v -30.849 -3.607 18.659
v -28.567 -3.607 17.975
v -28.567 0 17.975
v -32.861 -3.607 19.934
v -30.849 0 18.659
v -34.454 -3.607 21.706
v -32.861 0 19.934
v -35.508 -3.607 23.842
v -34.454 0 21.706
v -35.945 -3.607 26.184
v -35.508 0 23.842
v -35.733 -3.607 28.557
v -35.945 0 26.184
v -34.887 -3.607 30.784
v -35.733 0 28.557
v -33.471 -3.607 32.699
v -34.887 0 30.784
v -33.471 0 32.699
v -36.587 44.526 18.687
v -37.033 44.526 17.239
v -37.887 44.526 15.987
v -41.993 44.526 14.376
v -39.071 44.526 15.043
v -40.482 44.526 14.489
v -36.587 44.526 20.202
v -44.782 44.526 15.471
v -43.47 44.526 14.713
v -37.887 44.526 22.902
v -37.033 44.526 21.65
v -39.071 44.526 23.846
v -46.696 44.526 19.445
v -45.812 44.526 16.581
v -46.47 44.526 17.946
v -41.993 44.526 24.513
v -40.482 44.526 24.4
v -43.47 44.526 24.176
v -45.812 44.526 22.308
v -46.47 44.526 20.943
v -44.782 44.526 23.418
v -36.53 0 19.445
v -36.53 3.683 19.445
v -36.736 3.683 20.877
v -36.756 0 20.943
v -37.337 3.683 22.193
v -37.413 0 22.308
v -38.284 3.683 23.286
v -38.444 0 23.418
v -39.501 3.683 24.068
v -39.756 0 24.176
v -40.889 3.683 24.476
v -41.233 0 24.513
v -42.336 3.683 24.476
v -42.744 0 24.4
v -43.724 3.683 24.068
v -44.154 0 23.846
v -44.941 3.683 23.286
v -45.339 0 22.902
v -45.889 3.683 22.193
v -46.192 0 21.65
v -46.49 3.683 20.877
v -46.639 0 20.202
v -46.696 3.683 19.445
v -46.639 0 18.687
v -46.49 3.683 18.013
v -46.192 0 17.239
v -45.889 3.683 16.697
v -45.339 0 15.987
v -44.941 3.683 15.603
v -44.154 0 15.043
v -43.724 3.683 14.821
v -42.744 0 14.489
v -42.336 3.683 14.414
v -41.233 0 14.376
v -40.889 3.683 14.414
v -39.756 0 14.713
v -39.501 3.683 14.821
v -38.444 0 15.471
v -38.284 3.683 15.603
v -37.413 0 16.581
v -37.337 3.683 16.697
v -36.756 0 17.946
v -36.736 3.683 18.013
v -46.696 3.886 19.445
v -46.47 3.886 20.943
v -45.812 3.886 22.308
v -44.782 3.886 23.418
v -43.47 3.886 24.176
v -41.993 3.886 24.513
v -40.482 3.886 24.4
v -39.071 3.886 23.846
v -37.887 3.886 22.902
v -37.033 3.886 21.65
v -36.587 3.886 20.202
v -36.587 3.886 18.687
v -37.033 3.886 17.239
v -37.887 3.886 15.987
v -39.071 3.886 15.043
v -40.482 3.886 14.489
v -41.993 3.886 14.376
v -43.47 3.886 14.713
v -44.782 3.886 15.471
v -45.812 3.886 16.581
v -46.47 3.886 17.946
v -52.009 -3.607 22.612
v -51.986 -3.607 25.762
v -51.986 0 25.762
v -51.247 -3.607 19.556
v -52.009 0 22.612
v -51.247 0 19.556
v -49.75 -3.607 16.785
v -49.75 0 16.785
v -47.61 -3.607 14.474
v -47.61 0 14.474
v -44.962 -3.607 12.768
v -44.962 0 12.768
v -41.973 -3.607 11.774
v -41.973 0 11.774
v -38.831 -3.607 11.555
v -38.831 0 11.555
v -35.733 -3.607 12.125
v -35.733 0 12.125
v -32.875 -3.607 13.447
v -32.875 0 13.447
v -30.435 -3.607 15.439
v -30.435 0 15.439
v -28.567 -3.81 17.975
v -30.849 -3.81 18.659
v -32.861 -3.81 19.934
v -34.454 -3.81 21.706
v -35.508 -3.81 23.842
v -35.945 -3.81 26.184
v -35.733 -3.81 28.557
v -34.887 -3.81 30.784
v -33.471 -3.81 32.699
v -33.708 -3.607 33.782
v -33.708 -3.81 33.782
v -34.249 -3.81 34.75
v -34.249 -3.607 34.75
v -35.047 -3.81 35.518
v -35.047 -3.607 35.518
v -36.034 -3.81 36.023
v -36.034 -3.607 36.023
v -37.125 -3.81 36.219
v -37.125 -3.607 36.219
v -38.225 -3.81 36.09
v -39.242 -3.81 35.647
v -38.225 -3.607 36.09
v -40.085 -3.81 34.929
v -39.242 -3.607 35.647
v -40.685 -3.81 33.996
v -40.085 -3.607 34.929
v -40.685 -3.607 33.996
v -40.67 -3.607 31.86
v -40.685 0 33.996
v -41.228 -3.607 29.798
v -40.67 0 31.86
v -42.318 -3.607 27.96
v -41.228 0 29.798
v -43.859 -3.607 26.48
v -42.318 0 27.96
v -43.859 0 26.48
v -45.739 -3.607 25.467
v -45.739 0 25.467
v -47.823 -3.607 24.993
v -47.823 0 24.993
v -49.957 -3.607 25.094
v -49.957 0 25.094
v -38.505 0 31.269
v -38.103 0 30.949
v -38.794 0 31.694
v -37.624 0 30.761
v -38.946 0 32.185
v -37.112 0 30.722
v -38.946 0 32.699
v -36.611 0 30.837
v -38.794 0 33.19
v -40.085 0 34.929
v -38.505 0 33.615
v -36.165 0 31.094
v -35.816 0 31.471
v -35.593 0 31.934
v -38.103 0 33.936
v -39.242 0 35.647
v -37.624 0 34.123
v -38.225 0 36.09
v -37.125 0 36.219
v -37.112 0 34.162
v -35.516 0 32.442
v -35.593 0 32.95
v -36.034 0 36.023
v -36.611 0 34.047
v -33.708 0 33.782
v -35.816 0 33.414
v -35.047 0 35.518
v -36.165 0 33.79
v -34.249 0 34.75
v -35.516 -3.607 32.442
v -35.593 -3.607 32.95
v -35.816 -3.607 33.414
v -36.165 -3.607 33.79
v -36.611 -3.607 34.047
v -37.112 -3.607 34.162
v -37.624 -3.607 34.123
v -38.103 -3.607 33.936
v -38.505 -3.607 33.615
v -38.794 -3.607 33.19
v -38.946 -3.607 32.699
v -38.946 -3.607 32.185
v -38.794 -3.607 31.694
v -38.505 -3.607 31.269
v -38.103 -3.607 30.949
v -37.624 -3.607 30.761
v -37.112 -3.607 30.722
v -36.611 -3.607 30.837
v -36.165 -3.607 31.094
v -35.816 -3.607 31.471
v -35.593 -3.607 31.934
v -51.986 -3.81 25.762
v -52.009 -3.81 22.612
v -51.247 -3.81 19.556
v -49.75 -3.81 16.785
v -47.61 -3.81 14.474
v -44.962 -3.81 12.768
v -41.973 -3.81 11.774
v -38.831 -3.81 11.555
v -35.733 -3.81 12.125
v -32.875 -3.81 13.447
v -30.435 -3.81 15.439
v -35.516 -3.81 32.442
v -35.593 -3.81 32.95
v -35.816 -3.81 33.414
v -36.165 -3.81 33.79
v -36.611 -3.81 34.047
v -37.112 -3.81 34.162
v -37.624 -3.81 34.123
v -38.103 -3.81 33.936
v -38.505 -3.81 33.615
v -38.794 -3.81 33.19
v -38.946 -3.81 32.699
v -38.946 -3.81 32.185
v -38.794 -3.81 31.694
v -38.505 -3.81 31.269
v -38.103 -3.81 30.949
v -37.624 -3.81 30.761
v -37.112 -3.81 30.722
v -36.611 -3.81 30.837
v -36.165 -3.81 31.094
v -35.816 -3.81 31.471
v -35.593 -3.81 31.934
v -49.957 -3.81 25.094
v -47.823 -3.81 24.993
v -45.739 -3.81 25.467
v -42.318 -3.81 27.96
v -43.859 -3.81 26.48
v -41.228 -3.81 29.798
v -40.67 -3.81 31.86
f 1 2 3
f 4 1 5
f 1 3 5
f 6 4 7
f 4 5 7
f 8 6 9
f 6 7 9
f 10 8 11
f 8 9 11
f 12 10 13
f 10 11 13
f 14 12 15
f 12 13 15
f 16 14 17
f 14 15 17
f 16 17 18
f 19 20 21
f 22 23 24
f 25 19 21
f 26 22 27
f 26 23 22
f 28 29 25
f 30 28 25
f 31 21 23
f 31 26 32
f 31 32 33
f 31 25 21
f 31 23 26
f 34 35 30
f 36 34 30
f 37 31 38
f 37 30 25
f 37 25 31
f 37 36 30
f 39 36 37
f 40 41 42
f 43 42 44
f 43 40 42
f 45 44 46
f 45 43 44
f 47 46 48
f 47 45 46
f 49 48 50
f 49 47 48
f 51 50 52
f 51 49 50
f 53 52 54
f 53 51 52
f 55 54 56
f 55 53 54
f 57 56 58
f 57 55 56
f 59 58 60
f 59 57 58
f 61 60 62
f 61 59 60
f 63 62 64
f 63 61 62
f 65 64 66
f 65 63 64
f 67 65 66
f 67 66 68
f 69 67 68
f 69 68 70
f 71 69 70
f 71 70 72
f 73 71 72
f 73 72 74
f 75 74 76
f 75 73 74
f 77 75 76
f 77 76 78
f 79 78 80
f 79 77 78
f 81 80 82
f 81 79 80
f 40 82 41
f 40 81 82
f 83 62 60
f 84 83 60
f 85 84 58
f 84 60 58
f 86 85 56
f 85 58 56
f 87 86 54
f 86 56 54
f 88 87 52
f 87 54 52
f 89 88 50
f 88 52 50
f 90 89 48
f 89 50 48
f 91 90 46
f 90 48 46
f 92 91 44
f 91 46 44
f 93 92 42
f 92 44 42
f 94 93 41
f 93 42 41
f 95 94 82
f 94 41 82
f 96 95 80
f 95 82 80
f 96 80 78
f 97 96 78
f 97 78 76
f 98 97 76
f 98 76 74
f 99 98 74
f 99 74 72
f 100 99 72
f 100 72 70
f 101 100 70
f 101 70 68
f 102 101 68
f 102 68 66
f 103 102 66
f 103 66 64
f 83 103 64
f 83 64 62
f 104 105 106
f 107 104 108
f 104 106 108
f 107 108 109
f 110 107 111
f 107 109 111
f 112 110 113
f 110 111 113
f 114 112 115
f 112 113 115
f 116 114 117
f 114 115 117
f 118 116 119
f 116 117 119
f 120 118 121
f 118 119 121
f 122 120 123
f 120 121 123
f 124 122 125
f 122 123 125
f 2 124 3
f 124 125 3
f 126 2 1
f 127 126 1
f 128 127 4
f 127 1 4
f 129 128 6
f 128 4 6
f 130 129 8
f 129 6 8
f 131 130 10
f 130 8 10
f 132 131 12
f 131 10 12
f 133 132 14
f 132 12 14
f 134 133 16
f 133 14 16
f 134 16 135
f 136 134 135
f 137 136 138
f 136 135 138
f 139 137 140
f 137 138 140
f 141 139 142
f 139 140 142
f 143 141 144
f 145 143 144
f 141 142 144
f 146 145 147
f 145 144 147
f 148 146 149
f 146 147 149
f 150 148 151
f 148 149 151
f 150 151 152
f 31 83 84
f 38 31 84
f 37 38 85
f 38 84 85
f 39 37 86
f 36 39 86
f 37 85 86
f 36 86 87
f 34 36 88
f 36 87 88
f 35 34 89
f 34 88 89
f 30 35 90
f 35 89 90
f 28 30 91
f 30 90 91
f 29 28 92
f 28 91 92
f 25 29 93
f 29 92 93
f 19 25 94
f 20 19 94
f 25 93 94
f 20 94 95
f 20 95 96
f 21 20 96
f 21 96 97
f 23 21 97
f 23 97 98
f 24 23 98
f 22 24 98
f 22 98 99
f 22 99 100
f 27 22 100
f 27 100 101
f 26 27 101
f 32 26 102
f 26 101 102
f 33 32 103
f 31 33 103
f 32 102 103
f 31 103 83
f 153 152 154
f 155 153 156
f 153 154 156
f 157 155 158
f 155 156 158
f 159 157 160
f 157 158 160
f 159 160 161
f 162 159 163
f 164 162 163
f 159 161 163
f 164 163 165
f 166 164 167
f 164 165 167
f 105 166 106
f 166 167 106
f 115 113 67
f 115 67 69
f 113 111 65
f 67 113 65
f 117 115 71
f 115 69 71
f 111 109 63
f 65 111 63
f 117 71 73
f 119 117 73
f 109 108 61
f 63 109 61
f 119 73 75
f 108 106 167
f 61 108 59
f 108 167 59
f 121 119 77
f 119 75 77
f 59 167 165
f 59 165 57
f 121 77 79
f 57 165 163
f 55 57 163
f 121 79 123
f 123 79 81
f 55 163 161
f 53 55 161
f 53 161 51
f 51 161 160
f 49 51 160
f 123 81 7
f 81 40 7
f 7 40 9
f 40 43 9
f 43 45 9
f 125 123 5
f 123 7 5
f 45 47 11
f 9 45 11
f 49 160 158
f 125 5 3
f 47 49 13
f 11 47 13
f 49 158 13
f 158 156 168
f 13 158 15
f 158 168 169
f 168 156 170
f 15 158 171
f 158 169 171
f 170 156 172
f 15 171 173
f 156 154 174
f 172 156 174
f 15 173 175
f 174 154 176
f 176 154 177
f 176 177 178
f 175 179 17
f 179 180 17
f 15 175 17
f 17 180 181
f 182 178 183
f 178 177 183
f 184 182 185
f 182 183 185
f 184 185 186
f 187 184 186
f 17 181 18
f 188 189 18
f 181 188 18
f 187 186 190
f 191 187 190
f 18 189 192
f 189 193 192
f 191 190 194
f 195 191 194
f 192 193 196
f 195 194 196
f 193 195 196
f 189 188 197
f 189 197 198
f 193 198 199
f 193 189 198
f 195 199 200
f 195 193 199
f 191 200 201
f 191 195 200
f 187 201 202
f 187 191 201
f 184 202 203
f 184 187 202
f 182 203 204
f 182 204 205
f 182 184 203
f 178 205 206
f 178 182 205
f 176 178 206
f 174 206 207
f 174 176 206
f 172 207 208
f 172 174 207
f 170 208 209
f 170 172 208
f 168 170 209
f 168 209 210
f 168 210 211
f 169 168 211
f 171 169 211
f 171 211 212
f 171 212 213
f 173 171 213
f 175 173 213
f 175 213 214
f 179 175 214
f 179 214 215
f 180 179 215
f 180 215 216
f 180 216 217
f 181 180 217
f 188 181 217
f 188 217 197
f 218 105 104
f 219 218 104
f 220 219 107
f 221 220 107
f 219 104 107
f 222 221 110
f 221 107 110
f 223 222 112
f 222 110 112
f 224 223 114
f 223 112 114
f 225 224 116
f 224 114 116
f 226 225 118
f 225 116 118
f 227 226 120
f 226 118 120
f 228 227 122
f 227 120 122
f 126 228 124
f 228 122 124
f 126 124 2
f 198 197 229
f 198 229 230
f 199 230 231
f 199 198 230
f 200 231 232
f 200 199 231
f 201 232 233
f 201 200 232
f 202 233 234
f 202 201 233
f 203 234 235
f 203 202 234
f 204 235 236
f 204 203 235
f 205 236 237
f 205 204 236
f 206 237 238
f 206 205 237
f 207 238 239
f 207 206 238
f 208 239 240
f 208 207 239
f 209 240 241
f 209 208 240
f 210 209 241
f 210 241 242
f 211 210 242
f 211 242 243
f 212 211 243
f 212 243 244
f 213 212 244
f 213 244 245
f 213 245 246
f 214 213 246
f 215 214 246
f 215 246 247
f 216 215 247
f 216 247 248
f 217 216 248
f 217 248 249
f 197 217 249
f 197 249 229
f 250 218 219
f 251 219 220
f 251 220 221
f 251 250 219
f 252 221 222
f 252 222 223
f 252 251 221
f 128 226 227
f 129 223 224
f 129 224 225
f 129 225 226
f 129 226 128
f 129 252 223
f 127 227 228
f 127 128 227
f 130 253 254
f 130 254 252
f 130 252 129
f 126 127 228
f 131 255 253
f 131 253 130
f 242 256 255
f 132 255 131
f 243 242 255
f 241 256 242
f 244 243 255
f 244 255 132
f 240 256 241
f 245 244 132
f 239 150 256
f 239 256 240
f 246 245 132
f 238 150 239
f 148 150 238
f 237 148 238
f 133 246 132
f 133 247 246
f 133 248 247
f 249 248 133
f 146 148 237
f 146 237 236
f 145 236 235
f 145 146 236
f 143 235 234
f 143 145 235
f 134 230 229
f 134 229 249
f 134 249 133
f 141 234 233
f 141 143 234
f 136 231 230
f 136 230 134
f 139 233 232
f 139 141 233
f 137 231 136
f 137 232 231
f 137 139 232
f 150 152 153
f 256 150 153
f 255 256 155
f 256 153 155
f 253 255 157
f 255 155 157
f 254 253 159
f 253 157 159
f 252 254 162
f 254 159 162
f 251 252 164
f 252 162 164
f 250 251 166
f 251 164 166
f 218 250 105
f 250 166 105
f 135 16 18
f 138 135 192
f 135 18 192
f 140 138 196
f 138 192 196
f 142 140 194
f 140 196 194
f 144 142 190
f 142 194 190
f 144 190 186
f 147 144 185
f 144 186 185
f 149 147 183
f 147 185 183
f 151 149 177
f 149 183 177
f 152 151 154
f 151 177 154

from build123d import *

# Parameters (mm, degrees)
F0_R      = 1.7245608891
F1_DEPTH  = 3.81
F2_R      = 5.0827847808
F3_DEPTH  = 1.8796
F5_DEPTH  = 1.8034
F5_FACE_R = 5.0827847808
F4_R      = 4.0761496426
F1_FACE_R = 1.7245608891
F6_DEPTH  = 0.2032
F7_DEPTH  = 40.64


with BuildPart() as f1:
    # F0 (on Front) → F1 (new body)
    with BuildSketch(Plane.XZ):
        with BuildLine():
            ThreePointArc((-40.6846019076, 33.996454664), (-43.8586035919, 26.4801119862), (-51.985972327, 25.7620789885))
            ThreePointArc((-51.985972327, 25.7620789885), (-43.4988667945, 12.1772585573), (-28.5669643091, 17.975240502))
            ThreePointArc((-28.5669643091, 17.975240502), (-35.5078844362, 23.842234183), (-33.4709389841, 32.6993691762))
            ThreePointArc((-33.4709389841, 32.6993691762), (-36.5719585653, 36.1609542707), (-40.6846019076, 33.996454664))
        make_face()
        with Locations((-37.240639329, 32.4421264231)):
            Circle(F0_R, mode=Mode.SUBTRACT)
    extrude(amount=F1_DEPTH)

    # F2 (on Front) → F3 (join)
    with BuildSketch(Plane.XZ):
        with Locations((-41.6127927601, 19.4445531815)):
            Circle(F2_R)
    extrude(amount=-F3_DEPTH)

    # F5 (add): a face of the model
    f5_faces = [f1.faces().sort_by_distance(p)[0] for p in [
        (-41.6127927601, 1.8796, 19.4445531815),
    ]]
    extrude(f5_faces, amount=F5_DEPTH)

    # F5_face (on face) + F4 (on Front) + F1_face (on face) → F6 (join)
    with BuildSketch(Plane(origin=(-41.6127927601, 3.683, 19.4445531815), x_dir=(-1, 0, 0), z_dir=(0, 1, 0))):
        Circle(F5_FACE_R)
    with BuildSketch(Plane.XZ):
        with Locations((-41.713938117, 19.8042206466)):
            Circle(F4_R)
    with BuildSketch(Plane(origin=(-40.7069598519, -3.81, 21.1441009412), x_dir=(1, 0, 0), z_dir=(0, -1, 0))):
        with BuildLine():
            ThreePointArc((7.2360208677, 11.555268235), (4.1350012866, 15.0168533295), (0.0223579443, 12.8523537228))
            ThreePointArc((0.0223579443, 12.8523537228), (-3.15164374, 5.336011045), (-11.2790124751, 4.6179780473))
            ThreePointArc((-11.2790124751, 4.6179780473), (-2.7919069426, -8.9668423839), (12.1399955428, -3.1688604391))
            ThreePointArc((12.1399955428, -3.1688604391), (5.1990754157, 2.6981332418), (7.2360208677, 11.555268235))
        make_face()
        with Locations((3.4663205229, 11.2980254819)):
            Circle(F1_FACE_R, mode=Mode.SUBTRACT)
    extrude(amount=F6_DEPTH, dir=(0, 1, 0))

    # F7 (add): a face of the model
    f7_faces = [f1.faces().sort_by_distance(p)[0] for p in [
        (-41.6127927601, 3.8862, 19.4445531815),
    ]]
    extrude(f7_faces, amount=F7_DEPTH)


solid = f1.part
